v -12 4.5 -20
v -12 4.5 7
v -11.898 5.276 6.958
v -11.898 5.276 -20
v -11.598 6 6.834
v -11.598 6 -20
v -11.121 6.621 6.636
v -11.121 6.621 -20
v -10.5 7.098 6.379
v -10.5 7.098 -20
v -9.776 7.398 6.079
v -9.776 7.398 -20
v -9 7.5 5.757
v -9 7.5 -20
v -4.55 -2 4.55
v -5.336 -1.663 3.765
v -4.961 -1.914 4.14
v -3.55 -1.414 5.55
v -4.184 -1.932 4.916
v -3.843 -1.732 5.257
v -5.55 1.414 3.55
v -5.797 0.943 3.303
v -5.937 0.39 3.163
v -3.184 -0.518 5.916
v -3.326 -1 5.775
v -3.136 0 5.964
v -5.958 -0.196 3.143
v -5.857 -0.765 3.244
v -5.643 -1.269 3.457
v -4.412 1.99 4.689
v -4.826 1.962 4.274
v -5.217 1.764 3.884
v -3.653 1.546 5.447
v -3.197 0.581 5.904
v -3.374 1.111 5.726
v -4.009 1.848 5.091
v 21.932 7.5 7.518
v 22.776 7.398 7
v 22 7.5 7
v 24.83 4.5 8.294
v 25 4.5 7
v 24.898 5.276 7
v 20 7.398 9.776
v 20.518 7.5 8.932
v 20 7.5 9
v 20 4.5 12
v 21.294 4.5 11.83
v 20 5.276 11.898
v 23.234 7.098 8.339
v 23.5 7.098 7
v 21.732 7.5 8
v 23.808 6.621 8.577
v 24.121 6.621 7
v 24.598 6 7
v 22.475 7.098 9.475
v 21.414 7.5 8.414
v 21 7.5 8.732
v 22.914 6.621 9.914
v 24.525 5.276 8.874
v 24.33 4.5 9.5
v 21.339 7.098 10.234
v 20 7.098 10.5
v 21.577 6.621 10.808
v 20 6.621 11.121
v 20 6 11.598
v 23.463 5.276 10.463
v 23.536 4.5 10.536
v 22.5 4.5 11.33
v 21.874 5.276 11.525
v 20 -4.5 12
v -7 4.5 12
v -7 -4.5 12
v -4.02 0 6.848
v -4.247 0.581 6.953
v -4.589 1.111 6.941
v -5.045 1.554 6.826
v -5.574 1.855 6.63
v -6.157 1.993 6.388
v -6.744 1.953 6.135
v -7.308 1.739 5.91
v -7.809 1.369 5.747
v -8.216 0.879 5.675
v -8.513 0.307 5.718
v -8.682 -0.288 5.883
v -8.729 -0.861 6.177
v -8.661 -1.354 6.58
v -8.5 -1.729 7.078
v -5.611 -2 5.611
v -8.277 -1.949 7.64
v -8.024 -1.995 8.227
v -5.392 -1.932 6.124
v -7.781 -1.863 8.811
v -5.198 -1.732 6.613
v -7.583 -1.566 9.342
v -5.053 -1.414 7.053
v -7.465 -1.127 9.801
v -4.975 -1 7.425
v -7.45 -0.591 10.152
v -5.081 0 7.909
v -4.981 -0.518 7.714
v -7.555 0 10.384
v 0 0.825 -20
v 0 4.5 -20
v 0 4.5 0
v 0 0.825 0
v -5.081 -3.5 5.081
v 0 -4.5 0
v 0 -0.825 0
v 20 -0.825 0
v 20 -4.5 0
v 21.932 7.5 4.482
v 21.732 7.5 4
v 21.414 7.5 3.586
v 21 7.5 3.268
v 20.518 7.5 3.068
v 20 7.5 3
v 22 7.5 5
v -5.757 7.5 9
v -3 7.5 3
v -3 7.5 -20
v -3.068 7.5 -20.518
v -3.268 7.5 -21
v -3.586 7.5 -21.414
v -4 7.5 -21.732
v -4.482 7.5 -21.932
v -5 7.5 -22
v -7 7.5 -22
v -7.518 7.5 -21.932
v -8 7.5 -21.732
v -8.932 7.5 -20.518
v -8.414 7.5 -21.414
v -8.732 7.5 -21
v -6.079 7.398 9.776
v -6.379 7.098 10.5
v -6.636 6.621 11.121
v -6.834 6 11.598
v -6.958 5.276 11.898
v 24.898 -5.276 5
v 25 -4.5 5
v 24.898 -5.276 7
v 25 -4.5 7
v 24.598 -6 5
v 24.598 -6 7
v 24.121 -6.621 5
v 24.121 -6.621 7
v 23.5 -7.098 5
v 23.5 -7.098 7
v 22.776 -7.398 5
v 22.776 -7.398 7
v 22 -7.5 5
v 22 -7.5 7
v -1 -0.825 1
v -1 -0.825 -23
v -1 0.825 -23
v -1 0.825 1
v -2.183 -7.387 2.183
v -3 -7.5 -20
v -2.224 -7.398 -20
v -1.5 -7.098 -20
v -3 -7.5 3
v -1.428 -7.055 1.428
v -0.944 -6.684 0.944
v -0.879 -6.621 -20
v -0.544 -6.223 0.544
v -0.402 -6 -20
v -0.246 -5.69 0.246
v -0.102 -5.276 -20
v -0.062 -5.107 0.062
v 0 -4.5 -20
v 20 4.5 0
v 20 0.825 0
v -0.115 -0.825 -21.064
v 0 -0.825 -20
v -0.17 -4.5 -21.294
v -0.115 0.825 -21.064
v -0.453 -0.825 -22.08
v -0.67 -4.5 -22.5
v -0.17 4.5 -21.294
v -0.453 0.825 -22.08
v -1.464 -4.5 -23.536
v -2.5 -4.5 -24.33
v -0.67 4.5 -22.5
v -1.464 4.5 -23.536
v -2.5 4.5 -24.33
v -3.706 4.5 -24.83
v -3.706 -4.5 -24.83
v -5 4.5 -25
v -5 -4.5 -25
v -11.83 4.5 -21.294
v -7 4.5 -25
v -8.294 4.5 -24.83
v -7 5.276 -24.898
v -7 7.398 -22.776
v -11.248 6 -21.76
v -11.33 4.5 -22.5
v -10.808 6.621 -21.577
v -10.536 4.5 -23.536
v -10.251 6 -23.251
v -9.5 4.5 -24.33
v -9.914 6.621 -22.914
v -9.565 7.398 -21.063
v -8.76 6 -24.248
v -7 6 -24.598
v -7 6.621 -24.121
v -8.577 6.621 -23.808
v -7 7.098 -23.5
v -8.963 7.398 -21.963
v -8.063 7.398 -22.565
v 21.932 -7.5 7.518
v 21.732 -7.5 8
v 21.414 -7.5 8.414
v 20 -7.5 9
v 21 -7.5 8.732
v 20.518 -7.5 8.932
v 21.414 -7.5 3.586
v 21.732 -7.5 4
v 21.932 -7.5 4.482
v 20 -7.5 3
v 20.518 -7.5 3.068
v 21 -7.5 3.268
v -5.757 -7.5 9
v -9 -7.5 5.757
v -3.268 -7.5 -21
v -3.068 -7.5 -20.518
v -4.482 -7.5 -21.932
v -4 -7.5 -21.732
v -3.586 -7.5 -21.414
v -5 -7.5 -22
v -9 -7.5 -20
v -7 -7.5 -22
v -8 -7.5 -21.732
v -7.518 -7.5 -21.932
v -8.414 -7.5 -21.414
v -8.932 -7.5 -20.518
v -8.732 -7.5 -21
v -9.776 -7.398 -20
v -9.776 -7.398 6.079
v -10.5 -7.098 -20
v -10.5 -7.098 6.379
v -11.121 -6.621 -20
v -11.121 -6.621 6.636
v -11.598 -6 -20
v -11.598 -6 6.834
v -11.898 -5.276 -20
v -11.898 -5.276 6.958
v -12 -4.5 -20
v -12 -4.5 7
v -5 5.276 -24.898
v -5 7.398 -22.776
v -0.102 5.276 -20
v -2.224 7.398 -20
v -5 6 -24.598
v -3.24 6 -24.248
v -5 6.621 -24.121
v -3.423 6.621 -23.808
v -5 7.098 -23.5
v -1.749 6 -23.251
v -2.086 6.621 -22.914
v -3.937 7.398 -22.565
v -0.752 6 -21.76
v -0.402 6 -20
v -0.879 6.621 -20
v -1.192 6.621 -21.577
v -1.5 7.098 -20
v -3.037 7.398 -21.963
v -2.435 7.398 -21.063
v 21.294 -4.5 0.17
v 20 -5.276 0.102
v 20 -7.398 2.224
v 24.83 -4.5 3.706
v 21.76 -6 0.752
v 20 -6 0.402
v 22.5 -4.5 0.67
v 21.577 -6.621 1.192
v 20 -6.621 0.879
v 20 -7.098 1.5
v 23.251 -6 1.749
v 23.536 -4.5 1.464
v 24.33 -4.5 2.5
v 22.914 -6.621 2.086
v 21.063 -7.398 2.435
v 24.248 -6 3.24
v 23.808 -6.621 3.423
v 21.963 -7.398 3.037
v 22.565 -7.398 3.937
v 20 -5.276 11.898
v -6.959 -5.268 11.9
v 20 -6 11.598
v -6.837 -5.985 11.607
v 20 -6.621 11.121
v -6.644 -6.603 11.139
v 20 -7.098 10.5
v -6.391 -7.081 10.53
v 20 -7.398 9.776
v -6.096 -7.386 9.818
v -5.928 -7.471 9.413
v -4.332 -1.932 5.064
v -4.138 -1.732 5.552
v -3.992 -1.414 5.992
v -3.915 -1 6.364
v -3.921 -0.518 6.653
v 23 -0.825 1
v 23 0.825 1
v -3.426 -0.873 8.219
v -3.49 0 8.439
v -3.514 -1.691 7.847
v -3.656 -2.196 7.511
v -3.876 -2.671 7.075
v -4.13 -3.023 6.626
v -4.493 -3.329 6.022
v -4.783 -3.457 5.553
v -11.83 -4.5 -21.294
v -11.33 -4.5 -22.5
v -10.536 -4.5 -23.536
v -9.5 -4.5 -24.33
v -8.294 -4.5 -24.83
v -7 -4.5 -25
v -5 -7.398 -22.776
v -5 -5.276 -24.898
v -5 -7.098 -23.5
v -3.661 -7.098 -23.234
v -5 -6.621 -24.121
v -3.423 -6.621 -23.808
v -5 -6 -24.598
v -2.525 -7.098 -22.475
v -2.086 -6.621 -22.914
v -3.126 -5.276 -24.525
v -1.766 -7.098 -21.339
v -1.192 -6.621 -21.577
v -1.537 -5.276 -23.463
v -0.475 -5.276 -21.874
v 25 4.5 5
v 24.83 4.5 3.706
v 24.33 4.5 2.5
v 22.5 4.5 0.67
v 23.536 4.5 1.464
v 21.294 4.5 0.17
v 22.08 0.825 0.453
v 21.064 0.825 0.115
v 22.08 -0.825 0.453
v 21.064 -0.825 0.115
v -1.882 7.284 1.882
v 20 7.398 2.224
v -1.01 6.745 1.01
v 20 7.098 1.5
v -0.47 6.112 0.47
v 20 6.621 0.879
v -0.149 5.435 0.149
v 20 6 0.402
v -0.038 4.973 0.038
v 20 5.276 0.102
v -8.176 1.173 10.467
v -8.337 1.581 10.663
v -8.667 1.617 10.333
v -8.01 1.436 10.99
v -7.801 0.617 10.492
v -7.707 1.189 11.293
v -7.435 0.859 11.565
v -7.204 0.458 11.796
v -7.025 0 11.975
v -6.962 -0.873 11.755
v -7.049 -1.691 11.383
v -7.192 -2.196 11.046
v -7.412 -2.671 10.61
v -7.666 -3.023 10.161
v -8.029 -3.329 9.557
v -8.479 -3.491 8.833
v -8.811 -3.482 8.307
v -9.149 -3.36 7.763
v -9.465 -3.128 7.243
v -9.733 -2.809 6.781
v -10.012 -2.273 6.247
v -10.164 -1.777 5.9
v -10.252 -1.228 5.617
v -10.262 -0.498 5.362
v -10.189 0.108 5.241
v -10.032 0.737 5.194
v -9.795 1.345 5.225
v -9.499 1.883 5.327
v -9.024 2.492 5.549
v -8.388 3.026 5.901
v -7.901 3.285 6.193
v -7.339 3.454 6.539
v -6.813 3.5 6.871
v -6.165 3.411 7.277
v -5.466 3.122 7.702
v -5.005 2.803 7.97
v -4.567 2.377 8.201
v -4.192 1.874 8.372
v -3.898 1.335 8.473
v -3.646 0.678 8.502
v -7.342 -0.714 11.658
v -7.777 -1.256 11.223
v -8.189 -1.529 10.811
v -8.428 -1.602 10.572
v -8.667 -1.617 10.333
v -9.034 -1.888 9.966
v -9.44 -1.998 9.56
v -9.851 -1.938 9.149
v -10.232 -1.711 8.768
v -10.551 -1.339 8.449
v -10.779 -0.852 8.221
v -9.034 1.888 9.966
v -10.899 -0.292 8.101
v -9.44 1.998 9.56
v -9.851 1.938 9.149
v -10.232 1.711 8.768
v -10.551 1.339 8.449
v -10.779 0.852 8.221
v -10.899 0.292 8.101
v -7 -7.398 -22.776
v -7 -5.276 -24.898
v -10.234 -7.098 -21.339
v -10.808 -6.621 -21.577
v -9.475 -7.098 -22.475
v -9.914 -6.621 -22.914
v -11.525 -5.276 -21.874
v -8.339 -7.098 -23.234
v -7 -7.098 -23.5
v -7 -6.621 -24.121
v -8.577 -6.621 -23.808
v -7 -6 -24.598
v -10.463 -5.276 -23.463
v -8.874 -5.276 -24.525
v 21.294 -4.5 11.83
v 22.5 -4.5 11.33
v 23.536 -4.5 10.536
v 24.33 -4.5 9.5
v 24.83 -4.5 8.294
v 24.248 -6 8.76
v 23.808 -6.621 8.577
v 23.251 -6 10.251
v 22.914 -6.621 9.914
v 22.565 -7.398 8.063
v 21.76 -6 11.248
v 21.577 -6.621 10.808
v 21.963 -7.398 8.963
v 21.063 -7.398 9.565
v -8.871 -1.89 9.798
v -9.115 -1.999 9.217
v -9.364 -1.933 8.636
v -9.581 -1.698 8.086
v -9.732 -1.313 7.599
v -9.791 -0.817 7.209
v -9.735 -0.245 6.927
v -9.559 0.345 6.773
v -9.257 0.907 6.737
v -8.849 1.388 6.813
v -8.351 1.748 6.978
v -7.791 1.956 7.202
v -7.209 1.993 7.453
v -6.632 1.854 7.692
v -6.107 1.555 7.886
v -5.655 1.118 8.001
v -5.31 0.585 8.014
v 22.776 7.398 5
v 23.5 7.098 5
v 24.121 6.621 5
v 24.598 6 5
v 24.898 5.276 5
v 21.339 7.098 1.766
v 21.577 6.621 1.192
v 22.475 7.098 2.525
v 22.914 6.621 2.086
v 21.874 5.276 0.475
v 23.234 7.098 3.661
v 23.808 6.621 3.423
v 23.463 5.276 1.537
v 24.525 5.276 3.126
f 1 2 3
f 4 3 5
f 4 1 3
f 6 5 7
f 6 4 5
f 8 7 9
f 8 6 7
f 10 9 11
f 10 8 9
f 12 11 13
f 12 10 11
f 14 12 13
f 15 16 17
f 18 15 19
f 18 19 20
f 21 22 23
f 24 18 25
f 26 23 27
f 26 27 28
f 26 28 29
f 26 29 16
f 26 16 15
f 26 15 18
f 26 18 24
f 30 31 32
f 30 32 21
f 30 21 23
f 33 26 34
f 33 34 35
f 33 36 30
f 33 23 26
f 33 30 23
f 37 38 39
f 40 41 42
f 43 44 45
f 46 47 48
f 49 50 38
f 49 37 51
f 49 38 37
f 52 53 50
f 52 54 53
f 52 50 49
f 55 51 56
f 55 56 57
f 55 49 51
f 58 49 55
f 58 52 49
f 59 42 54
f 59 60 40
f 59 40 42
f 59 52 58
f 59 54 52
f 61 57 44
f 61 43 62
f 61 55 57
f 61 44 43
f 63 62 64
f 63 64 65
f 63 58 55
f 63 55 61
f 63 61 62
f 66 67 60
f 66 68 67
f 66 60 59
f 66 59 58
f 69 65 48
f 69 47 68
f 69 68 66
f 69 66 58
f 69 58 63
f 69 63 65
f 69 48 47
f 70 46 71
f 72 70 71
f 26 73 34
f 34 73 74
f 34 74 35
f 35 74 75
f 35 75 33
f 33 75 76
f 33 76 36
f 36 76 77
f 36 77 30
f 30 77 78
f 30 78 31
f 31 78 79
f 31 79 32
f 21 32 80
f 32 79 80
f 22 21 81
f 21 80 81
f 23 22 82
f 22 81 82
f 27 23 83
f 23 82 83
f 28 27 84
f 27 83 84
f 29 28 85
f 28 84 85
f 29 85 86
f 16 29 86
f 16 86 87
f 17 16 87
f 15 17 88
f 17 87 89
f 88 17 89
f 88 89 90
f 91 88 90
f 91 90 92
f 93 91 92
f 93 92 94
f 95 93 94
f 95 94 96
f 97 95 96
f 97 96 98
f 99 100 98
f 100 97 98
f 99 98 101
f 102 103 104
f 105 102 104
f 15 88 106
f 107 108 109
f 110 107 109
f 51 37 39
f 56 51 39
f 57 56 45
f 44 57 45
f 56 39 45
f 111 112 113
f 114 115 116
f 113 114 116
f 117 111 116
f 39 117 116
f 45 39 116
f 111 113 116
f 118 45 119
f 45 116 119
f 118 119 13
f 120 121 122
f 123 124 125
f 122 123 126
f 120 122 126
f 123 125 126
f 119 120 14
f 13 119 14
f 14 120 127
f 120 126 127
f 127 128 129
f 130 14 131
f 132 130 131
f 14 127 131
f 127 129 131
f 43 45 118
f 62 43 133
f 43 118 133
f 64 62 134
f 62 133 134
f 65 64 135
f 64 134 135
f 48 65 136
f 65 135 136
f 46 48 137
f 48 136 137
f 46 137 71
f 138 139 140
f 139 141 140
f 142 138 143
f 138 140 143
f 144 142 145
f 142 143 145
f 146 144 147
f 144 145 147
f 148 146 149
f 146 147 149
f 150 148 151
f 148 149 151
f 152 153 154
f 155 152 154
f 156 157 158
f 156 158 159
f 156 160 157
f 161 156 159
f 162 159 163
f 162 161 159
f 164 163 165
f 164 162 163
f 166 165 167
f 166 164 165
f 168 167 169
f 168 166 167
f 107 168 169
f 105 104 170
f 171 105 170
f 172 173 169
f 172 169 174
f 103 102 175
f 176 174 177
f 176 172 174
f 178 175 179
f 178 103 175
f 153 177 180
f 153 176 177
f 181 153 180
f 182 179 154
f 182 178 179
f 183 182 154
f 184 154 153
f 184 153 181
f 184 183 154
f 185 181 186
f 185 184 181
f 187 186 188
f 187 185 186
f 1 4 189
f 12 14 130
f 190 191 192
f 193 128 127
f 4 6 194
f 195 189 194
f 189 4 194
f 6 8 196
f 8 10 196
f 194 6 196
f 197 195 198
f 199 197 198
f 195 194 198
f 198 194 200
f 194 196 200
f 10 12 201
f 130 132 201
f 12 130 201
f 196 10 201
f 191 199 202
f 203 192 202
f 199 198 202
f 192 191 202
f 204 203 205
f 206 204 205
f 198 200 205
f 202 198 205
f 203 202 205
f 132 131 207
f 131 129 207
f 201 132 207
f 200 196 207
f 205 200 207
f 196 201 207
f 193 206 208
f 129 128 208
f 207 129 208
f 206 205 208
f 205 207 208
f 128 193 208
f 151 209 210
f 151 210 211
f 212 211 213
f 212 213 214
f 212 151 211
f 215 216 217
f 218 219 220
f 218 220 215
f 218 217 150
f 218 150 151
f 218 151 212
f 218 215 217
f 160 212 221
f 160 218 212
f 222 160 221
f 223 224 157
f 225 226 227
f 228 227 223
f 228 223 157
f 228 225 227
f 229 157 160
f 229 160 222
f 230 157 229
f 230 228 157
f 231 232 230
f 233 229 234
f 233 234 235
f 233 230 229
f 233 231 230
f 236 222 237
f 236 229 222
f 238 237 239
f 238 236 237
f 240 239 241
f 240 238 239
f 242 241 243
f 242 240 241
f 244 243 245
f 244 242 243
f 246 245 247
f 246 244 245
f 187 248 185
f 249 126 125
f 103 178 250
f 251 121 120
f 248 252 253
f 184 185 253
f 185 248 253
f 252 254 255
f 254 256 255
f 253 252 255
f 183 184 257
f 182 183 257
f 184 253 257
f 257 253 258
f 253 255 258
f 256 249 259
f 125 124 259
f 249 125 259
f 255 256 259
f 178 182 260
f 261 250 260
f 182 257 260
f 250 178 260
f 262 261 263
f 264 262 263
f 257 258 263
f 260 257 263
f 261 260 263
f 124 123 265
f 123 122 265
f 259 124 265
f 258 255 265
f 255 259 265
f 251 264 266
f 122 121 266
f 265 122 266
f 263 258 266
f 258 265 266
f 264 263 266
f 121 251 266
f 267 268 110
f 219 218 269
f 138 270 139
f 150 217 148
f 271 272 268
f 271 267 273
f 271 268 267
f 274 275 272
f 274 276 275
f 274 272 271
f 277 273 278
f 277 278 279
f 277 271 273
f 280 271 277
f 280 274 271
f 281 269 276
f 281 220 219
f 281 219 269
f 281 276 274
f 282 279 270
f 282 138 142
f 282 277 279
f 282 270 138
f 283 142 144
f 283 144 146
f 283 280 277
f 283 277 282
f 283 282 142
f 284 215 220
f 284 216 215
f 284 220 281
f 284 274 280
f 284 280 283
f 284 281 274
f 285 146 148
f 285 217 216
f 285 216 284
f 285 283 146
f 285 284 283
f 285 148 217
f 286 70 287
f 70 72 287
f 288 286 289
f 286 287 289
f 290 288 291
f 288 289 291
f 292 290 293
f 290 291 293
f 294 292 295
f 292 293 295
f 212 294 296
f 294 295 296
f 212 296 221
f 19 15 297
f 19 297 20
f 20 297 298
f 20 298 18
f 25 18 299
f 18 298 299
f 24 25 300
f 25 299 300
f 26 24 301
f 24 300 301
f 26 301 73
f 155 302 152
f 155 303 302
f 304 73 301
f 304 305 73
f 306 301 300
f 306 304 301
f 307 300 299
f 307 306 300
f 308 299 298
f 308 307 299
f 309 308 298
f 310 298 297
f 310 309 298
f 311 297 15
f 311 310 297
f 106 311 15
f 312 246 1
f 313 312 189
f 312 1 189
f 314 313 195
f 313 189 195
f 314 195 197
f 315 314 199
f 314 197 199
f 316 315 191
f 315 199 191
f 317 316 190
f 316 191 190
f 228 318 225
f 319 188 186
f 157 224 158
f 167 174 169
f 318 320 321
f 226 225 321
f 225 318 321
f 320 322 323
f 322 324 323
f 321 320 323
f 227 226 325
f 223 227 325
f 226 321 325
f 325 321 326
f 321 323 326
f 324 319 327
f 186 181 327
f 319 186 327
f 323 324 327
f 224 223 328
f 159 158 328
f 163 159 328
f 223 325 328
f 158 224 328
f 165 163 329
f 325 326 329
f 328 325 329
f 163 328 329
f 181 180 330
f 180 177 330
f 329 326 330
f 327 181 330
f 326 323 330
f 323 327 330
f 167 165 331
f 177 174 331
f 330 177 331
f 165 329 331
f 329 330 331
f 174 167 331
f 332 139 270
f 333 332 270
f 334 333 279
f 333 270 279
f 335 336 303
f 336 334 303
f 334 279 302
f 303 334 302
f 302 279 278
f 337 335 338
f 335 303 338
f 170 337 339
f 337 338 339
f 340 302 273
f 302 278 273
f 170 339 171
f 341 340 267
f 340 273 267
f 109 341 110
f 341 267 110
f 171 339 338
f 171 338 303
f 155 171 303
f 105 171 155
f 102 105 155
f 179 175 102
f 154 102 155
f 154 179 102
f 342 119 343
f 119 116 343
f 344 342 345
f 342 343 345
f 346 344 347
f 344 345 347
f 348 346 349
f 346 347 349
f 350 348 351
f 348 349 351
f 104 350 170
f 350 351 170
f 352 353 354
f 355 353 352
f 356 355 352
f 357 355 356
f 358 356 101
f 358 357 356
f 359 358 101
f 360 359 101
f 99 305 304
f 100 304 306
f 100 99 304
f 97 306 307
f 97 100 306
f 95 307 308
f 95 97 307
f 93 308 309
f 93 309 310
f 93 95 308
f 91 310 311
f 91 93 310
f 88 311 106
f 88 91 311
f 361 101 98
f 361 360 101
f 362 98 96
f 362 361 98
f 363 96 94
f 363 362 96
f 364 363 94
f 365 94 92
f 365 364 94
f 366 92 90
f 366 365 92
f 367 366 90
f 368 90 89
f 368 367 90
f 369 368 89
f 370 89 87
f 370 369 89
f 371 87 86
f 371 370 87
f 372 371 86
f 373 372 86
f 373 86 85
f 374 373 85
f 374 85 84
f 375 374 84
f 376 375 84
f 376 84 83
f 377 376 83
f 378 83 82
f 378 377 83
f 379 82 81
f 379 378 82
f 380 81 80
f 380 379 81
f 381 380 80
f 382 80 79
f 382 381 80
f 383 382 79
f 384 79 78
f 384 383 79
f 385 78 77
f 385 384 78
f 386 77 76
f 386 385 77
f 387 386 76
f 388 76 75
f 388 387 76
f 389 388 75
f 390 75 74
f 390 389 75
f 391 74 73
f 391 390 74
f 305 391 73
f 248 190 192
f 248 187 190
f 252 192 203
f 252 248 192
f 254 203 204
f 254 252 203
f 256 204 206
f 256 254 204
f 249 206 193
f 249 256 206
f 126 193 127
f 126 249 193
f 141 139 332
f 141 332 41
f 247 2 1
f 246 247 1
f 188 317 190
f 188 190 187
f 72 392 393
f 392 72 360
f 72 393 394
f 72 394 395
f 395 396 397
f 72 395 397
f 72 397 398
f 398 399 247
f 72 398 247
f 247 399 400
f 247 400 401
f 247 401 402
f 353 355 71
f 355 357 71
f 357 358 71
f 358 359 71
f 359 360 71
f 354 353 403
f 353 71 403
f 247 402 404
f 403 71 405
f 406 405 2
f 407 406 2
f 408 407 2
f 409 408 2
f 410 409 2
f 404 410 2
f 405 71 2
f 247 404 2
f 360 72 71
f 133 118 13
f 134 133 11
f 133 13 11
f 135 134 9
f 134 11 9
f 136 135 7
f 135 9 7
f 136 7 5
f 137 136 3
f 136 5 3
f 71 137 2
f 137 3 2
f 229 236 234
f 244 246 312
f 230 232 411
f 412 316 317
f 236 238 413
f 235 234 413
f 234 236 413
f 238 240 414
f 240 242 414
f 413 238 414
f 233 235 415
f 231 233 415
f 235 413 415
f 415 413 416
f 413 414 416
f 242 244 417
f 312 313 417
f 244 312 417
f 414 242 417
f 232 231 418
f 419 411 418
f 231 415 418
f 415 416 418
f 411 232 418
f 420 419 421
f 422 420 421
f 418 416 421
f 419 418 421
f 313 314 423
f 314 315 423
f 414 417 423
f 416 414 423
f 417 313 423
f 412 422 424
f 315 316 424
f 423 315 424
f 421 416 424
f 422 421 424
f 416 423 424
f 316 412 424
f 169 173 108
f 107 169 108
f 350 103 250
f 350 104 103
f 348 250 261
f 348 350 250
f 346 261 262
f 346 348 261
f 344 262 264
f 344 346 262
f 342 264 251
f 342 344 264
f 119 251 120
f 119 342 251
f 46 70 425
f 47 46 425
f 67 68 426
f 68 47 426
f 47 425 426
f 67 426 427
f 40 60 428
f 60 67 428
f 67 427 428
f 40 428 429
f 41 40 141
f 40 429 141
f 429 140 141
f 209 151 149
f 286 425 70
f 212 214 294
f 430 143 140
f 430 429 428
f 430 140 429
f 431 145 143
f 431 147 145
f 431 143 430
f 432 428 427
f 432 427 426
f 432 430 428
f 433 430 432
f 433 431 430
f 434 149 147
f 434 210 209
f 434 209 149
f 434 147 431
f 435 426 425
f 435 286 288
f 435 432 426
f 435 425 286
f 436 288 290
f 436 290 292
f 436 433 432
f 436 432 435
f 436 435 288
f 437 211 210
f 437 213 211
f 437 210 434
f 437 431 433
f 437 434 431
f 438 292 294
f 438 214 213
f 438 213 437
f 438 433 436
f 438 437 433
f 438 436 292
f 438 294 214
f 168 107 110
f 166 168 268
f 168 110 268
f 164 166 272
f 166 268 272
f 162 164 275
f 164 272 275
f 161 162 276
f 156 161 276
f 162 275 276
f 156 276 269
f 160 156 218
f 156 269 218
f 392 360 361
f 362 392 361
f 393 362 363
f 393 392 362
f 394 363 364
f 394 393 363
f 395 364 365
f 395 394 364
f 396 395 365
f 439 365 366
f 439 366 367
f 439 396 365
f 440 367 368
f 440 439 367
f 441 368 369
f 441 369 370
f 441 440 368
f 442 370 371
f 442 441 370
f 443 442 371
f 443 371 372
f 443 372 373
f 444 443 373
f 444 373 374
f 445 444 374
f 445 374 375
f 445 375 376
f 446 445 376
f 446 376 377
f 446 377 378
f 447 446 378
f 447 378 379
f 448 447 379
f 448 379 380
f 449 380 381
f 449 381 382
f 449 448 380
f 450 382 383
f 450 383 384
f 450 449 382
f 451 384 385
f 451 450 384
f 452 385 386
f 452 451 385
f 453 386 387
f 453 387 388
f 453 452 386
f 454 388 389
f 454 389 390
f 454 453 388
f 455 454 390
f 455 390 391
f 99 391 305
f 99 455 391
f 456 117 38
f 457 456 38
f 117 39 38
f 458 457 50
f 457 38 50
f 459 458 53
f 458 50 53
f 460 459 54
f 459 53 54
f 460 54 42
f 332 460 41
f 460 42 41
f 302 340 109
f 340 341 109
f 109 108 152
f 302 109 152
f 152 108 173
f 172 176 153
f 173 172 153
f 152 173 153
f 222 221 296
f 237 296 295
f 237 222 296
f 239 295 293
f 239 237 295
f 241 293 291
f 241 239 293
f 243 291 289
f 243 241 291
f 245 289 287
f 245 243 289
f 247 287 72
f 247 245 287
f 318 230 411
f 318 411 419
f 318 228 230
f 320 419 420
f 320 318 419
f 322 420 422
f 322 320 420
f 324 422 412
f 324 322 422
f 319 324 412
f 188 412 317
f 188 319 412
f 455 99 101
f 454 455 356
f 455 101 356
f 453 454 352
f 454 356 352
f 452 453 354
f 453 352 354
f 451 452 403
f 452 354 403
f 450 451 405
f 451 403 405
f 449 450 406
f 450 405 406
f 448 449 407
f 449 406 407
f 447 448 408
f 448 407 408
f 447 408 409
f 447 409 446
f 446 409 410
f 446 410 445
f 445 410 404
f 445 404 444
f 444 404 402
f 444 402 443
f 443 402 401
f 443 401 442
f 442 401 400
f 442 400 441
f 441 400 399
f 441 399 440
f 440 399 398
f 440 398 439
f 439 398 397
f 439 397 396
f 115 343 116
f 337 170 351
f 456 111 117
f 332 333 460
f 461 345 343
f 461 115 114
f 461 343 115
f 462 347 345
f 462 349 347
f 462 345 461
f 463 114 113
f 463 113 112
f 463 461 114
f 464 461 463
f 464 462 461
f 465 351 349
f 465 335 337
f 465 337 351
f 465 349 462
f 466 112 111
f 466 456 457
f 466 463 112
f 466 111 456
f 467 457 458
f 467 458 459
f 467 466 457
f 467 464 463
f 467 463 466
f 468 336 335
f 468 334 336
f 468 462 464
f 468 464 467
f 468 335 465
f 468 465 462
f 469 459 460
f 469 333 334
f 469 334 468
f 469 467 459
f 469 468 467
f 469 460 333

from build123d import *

# Parameters (mm, degrees)
BOSS_EXTRUDE1_DEPTH = 7.5
SKETCH3_W           = 25
SKETCH3_H           = 1.65
CUT_EXTRUDE1_DEPTH  = 1
SKETCH4_W           = 1
SKETCH4_H           = 1.65
CUT_EXTRUDE2_DEPTH  = 26
FILLET1_R           = 5
FILLET2_R           = 3
SKETCH5_R           = 2
CUT_EXTRUDE3_DEPTH  = 7
CUT_SWEEP1_PITCH    = 5


with BuildPart() as part:
    # Sketch1 → Boss-Extrude1 (new, symmetric)
    with BuildSketch(Plane(origin=(0, 0, 0), x_dir=(1, 0, 0), z_dir=(0, 1, 0))):
        Polygon((0, 25), (0, 0), (25, 0), (25, -12), (-7, -12), (-12, -7), (-12, 25), align=None)
    extrude(amount=BOSS_EXTRUDE1_DEPTH, both=True)

    # Sketch3 → Cut-Extrude1 (cut)
    with BuildSketch(Plane(origin=(0, 0, 0), x_dir=(-1, 0, 0), z_dir=(0, 0, -1))):
        with Locations((-12.5, 0)):
            Rectangle(SKETCH3_W, SKETCH3_H)
    extrude(amount=-CUT_EXTRUDE1_DEPTH, mode=Mode.SUBTRACT)

    # Sketch4 → Cut-Extrude2 (cut)
    with BuildSketch(Plane(origin=(0, 0, -25), x_dir=(-1, 0, 0), z_dir=(0, 0, -1))):
        with Locations((0.5, 0)):
            Rectangle(SKETCH4_W, SKETCH4_H)
    extrude(amount=-CUT_EXTRUDE2_DEPTH, mode=Mode.SUBTRACT)

    # Fillet1
    fillet1_edges = [part.edges().sort_by_distance(p)[0] for p in [
        (25, -4.1625, 0),
        (25, 0, 12),
        (0, 4.1625, -25),
        (-12, 0, -25),
    ]]
    fillet(fillet1_edges, radius=FILLET1_R - 0.0001)  # a hair under: the kernel refuses the full size

    # Fillet2
    fillet2_edges = [part.edges().sort_by_distance(p)[0] for p in [
        (-9.5, 7.5, 9.5),
        (6.50005, 7.5, 12),
        (0, 7.5, -10.00005),
        (10.00005, -7.5, 0),
        (-6, -7.5, -25),
        (25, -7.5, 6),
        (-12, -7.5, -6.50005),
        (-10.535563195, -7.5, -23.535563195),
        (-1.464436908, -7.5, -23.535563298),
        (23.535563195, -7.5, 10.535563195),
        (23.535563195, -7.5, 1.464436805),
        (25, 7.5, 6),
        (-6, 7.5, -25),
        (-12, 7.5, -6.50005),
        (10.00005, 7.5, 0),
        (-10.535563195, 7.5, -23.535563195),
        (-1.464436805, 7.5, -23.535563195),
        (23.535563195, 7.5, 10.535563195),
        (23.535563195, 7.5, 1.464436805),
        (0, -7.5, -10.000050146),
        (6.50005, -7.5, 12),
        (-9.5, -7.5, 9.5),
    ]]
    fillet(fillet2_edges, radius=FILLET2_R)

    # Sketch5 → Cut-Extrude3 (cut)
    with BuildSketch(Plane(origin=(-9.5, 0, 9.5), x_dir=(0.7071067811865475, 0, 0.7071067811865477), z_dir=(-0.7071067811865477, 0, 0.7071067811865475))):
        Circle(SKETCH5_R)
    extrude(amount=-CUT_EXTRUDE3_DEPTH, mode=Mode.SUBTRACT)

    # Cut-Sweep1: arcs per turn and ends read off the stored shape
    # Cut-Sweep1: the profile of Sketch8 screwed along a right-hand helix through 2.25 turns, 12 arcs to a turn; built about Z, then put on its axis
    cut_sweep1_z = Axis((0, 0, 0), (0, 0, 1))
    cut_sweep1_corners = [(2, 0, -4.25), (3.5, 0, -5), (2, 0, -5.75), (2, 0, -5)]
    with BuildLine(mode=Mode.PRIVATE) as cut_sweep1_profile:
        Line(cut_sweep1_corners[0], cut_sweep1_corners[1])
        Line(cut_sweep1_corners[1], cut_sweep1_corners[2])
        Line(cut_sweep1_corners[2], cut_sweep1_corners[3])
        Line(cut_sweep1_corners[3], cut_sweep1_corners[0])
    cut_sweep1_cap = Face(cut_sweep1_profile.wire())
    cut_sweep1_turn_angles = [0, 15, 30, 45, 60, 75, 90, 105, 120, 135, 150, 165, 180, 195, 210, 225, 240, 255, 270, 285, 300, 315, 330, 345, 360]
    cut_sweep1_turn_weights = [1, 0.9659258262890683, 1, 0.9659258262890683, 1, 0.9659258262890683, 1, 0.9659258262890683, 1, 0.9659258262890683, 1, 0.9659258262890683, 1, 0.9659258262890683, 1, 0.9659258262890683, 1, 0.9659258262890683, 1, 0.9659258262890683, 1, 0.9659258262890683, 1, 0.9659258262890683, 1]
    cut_sweep1_turn_rails = [Edge.make_bspline([Vector(p[0], p[1], 0).rotate(cut_sweep1_z, cut_sweep1_turn_angles[k]) / cut_sweep1_turn_weights[k] + Vector(0, 0, p[2] + CUT_SWEEP1_PITCH * cut_sweep1_turn_angles[k] / 360) for k in range(25)], [0, 0, 0, 1, 1, 2, 2, 3, 3, 4, 4, 5, 5, 6, 6, 7, 7, 8, 8, 9, 9, 10, 10, 11, 11, 12, 12, 12], 2, cut_sweep1_turn_weights) for p in cut_sweep1_corners]
    cut_sweep1_turn_sides = [Face.make_surface_from_curves(cut_sweep1_turn_rails[p[0]], cut_sweep1_turn_rails[p[1]]) for p in [(0, 1), (1, 2), (2, 3), (3, 0)]]
    cut_sweep1_last_angles = [720, 735, 750, 765, 780, 795, 810]
    cut_sweep1_last_weights = [1, 0.9659258262890683, 1, 0.9659258262890683, 1, 0.9659258262890683, 1]
    cut_sweep1_last_rails = [Edge.make_bspline([Vector(p[0], p[1], 0).rotate(cut_sweep1_z, cut_sweep1_last_angles[k]) / cut_sweep1_last_weights[k] + Vector(0, 0, p[2] + CUT_SWEEP1_PITCH * cut_sweep1_last_angles[k] / 360) for k in range(7)], [0, 0, 0, 1, 1, 2, 2, 3, 3, 3], 2, cut_sweep1_last_weights) for p in cut_sweep1_corners]
    cut_sweep1_last_sides = [Face.make_surface_from_curves(cut_sweep1_last_rails[p[0]], cut_sweep1_last_rails[p[1]]) for p in [(0, 1), (1, 2), (2, 3), (3, 0)]]
    cut_sweep1 = Plane(origin=(-9.5, 0, 9.5), x_dir=(0.7071067811865475, 0, 0.7071067811865477), z_dir=(0.7071067811865477, 0, -0.7071067811865475)) * Solid(Shell([*[p.moved(Location((0, 0, CUT_SWEEP1_PITCH * i))) for i in range(2) for p in cut_sweep1_turn_sides], *cut_sweep1_last_sides, cut_sweep1_cap, cut_sweep1_cap.rotate(cut_sweep1_z, 810).moved(Location((0, 0, CUT_SWEEP1_PITCH * 810 / 360)))]))
    add(cut_sweep1, mode=Mode.SUBTRACT)


solid = part.part
